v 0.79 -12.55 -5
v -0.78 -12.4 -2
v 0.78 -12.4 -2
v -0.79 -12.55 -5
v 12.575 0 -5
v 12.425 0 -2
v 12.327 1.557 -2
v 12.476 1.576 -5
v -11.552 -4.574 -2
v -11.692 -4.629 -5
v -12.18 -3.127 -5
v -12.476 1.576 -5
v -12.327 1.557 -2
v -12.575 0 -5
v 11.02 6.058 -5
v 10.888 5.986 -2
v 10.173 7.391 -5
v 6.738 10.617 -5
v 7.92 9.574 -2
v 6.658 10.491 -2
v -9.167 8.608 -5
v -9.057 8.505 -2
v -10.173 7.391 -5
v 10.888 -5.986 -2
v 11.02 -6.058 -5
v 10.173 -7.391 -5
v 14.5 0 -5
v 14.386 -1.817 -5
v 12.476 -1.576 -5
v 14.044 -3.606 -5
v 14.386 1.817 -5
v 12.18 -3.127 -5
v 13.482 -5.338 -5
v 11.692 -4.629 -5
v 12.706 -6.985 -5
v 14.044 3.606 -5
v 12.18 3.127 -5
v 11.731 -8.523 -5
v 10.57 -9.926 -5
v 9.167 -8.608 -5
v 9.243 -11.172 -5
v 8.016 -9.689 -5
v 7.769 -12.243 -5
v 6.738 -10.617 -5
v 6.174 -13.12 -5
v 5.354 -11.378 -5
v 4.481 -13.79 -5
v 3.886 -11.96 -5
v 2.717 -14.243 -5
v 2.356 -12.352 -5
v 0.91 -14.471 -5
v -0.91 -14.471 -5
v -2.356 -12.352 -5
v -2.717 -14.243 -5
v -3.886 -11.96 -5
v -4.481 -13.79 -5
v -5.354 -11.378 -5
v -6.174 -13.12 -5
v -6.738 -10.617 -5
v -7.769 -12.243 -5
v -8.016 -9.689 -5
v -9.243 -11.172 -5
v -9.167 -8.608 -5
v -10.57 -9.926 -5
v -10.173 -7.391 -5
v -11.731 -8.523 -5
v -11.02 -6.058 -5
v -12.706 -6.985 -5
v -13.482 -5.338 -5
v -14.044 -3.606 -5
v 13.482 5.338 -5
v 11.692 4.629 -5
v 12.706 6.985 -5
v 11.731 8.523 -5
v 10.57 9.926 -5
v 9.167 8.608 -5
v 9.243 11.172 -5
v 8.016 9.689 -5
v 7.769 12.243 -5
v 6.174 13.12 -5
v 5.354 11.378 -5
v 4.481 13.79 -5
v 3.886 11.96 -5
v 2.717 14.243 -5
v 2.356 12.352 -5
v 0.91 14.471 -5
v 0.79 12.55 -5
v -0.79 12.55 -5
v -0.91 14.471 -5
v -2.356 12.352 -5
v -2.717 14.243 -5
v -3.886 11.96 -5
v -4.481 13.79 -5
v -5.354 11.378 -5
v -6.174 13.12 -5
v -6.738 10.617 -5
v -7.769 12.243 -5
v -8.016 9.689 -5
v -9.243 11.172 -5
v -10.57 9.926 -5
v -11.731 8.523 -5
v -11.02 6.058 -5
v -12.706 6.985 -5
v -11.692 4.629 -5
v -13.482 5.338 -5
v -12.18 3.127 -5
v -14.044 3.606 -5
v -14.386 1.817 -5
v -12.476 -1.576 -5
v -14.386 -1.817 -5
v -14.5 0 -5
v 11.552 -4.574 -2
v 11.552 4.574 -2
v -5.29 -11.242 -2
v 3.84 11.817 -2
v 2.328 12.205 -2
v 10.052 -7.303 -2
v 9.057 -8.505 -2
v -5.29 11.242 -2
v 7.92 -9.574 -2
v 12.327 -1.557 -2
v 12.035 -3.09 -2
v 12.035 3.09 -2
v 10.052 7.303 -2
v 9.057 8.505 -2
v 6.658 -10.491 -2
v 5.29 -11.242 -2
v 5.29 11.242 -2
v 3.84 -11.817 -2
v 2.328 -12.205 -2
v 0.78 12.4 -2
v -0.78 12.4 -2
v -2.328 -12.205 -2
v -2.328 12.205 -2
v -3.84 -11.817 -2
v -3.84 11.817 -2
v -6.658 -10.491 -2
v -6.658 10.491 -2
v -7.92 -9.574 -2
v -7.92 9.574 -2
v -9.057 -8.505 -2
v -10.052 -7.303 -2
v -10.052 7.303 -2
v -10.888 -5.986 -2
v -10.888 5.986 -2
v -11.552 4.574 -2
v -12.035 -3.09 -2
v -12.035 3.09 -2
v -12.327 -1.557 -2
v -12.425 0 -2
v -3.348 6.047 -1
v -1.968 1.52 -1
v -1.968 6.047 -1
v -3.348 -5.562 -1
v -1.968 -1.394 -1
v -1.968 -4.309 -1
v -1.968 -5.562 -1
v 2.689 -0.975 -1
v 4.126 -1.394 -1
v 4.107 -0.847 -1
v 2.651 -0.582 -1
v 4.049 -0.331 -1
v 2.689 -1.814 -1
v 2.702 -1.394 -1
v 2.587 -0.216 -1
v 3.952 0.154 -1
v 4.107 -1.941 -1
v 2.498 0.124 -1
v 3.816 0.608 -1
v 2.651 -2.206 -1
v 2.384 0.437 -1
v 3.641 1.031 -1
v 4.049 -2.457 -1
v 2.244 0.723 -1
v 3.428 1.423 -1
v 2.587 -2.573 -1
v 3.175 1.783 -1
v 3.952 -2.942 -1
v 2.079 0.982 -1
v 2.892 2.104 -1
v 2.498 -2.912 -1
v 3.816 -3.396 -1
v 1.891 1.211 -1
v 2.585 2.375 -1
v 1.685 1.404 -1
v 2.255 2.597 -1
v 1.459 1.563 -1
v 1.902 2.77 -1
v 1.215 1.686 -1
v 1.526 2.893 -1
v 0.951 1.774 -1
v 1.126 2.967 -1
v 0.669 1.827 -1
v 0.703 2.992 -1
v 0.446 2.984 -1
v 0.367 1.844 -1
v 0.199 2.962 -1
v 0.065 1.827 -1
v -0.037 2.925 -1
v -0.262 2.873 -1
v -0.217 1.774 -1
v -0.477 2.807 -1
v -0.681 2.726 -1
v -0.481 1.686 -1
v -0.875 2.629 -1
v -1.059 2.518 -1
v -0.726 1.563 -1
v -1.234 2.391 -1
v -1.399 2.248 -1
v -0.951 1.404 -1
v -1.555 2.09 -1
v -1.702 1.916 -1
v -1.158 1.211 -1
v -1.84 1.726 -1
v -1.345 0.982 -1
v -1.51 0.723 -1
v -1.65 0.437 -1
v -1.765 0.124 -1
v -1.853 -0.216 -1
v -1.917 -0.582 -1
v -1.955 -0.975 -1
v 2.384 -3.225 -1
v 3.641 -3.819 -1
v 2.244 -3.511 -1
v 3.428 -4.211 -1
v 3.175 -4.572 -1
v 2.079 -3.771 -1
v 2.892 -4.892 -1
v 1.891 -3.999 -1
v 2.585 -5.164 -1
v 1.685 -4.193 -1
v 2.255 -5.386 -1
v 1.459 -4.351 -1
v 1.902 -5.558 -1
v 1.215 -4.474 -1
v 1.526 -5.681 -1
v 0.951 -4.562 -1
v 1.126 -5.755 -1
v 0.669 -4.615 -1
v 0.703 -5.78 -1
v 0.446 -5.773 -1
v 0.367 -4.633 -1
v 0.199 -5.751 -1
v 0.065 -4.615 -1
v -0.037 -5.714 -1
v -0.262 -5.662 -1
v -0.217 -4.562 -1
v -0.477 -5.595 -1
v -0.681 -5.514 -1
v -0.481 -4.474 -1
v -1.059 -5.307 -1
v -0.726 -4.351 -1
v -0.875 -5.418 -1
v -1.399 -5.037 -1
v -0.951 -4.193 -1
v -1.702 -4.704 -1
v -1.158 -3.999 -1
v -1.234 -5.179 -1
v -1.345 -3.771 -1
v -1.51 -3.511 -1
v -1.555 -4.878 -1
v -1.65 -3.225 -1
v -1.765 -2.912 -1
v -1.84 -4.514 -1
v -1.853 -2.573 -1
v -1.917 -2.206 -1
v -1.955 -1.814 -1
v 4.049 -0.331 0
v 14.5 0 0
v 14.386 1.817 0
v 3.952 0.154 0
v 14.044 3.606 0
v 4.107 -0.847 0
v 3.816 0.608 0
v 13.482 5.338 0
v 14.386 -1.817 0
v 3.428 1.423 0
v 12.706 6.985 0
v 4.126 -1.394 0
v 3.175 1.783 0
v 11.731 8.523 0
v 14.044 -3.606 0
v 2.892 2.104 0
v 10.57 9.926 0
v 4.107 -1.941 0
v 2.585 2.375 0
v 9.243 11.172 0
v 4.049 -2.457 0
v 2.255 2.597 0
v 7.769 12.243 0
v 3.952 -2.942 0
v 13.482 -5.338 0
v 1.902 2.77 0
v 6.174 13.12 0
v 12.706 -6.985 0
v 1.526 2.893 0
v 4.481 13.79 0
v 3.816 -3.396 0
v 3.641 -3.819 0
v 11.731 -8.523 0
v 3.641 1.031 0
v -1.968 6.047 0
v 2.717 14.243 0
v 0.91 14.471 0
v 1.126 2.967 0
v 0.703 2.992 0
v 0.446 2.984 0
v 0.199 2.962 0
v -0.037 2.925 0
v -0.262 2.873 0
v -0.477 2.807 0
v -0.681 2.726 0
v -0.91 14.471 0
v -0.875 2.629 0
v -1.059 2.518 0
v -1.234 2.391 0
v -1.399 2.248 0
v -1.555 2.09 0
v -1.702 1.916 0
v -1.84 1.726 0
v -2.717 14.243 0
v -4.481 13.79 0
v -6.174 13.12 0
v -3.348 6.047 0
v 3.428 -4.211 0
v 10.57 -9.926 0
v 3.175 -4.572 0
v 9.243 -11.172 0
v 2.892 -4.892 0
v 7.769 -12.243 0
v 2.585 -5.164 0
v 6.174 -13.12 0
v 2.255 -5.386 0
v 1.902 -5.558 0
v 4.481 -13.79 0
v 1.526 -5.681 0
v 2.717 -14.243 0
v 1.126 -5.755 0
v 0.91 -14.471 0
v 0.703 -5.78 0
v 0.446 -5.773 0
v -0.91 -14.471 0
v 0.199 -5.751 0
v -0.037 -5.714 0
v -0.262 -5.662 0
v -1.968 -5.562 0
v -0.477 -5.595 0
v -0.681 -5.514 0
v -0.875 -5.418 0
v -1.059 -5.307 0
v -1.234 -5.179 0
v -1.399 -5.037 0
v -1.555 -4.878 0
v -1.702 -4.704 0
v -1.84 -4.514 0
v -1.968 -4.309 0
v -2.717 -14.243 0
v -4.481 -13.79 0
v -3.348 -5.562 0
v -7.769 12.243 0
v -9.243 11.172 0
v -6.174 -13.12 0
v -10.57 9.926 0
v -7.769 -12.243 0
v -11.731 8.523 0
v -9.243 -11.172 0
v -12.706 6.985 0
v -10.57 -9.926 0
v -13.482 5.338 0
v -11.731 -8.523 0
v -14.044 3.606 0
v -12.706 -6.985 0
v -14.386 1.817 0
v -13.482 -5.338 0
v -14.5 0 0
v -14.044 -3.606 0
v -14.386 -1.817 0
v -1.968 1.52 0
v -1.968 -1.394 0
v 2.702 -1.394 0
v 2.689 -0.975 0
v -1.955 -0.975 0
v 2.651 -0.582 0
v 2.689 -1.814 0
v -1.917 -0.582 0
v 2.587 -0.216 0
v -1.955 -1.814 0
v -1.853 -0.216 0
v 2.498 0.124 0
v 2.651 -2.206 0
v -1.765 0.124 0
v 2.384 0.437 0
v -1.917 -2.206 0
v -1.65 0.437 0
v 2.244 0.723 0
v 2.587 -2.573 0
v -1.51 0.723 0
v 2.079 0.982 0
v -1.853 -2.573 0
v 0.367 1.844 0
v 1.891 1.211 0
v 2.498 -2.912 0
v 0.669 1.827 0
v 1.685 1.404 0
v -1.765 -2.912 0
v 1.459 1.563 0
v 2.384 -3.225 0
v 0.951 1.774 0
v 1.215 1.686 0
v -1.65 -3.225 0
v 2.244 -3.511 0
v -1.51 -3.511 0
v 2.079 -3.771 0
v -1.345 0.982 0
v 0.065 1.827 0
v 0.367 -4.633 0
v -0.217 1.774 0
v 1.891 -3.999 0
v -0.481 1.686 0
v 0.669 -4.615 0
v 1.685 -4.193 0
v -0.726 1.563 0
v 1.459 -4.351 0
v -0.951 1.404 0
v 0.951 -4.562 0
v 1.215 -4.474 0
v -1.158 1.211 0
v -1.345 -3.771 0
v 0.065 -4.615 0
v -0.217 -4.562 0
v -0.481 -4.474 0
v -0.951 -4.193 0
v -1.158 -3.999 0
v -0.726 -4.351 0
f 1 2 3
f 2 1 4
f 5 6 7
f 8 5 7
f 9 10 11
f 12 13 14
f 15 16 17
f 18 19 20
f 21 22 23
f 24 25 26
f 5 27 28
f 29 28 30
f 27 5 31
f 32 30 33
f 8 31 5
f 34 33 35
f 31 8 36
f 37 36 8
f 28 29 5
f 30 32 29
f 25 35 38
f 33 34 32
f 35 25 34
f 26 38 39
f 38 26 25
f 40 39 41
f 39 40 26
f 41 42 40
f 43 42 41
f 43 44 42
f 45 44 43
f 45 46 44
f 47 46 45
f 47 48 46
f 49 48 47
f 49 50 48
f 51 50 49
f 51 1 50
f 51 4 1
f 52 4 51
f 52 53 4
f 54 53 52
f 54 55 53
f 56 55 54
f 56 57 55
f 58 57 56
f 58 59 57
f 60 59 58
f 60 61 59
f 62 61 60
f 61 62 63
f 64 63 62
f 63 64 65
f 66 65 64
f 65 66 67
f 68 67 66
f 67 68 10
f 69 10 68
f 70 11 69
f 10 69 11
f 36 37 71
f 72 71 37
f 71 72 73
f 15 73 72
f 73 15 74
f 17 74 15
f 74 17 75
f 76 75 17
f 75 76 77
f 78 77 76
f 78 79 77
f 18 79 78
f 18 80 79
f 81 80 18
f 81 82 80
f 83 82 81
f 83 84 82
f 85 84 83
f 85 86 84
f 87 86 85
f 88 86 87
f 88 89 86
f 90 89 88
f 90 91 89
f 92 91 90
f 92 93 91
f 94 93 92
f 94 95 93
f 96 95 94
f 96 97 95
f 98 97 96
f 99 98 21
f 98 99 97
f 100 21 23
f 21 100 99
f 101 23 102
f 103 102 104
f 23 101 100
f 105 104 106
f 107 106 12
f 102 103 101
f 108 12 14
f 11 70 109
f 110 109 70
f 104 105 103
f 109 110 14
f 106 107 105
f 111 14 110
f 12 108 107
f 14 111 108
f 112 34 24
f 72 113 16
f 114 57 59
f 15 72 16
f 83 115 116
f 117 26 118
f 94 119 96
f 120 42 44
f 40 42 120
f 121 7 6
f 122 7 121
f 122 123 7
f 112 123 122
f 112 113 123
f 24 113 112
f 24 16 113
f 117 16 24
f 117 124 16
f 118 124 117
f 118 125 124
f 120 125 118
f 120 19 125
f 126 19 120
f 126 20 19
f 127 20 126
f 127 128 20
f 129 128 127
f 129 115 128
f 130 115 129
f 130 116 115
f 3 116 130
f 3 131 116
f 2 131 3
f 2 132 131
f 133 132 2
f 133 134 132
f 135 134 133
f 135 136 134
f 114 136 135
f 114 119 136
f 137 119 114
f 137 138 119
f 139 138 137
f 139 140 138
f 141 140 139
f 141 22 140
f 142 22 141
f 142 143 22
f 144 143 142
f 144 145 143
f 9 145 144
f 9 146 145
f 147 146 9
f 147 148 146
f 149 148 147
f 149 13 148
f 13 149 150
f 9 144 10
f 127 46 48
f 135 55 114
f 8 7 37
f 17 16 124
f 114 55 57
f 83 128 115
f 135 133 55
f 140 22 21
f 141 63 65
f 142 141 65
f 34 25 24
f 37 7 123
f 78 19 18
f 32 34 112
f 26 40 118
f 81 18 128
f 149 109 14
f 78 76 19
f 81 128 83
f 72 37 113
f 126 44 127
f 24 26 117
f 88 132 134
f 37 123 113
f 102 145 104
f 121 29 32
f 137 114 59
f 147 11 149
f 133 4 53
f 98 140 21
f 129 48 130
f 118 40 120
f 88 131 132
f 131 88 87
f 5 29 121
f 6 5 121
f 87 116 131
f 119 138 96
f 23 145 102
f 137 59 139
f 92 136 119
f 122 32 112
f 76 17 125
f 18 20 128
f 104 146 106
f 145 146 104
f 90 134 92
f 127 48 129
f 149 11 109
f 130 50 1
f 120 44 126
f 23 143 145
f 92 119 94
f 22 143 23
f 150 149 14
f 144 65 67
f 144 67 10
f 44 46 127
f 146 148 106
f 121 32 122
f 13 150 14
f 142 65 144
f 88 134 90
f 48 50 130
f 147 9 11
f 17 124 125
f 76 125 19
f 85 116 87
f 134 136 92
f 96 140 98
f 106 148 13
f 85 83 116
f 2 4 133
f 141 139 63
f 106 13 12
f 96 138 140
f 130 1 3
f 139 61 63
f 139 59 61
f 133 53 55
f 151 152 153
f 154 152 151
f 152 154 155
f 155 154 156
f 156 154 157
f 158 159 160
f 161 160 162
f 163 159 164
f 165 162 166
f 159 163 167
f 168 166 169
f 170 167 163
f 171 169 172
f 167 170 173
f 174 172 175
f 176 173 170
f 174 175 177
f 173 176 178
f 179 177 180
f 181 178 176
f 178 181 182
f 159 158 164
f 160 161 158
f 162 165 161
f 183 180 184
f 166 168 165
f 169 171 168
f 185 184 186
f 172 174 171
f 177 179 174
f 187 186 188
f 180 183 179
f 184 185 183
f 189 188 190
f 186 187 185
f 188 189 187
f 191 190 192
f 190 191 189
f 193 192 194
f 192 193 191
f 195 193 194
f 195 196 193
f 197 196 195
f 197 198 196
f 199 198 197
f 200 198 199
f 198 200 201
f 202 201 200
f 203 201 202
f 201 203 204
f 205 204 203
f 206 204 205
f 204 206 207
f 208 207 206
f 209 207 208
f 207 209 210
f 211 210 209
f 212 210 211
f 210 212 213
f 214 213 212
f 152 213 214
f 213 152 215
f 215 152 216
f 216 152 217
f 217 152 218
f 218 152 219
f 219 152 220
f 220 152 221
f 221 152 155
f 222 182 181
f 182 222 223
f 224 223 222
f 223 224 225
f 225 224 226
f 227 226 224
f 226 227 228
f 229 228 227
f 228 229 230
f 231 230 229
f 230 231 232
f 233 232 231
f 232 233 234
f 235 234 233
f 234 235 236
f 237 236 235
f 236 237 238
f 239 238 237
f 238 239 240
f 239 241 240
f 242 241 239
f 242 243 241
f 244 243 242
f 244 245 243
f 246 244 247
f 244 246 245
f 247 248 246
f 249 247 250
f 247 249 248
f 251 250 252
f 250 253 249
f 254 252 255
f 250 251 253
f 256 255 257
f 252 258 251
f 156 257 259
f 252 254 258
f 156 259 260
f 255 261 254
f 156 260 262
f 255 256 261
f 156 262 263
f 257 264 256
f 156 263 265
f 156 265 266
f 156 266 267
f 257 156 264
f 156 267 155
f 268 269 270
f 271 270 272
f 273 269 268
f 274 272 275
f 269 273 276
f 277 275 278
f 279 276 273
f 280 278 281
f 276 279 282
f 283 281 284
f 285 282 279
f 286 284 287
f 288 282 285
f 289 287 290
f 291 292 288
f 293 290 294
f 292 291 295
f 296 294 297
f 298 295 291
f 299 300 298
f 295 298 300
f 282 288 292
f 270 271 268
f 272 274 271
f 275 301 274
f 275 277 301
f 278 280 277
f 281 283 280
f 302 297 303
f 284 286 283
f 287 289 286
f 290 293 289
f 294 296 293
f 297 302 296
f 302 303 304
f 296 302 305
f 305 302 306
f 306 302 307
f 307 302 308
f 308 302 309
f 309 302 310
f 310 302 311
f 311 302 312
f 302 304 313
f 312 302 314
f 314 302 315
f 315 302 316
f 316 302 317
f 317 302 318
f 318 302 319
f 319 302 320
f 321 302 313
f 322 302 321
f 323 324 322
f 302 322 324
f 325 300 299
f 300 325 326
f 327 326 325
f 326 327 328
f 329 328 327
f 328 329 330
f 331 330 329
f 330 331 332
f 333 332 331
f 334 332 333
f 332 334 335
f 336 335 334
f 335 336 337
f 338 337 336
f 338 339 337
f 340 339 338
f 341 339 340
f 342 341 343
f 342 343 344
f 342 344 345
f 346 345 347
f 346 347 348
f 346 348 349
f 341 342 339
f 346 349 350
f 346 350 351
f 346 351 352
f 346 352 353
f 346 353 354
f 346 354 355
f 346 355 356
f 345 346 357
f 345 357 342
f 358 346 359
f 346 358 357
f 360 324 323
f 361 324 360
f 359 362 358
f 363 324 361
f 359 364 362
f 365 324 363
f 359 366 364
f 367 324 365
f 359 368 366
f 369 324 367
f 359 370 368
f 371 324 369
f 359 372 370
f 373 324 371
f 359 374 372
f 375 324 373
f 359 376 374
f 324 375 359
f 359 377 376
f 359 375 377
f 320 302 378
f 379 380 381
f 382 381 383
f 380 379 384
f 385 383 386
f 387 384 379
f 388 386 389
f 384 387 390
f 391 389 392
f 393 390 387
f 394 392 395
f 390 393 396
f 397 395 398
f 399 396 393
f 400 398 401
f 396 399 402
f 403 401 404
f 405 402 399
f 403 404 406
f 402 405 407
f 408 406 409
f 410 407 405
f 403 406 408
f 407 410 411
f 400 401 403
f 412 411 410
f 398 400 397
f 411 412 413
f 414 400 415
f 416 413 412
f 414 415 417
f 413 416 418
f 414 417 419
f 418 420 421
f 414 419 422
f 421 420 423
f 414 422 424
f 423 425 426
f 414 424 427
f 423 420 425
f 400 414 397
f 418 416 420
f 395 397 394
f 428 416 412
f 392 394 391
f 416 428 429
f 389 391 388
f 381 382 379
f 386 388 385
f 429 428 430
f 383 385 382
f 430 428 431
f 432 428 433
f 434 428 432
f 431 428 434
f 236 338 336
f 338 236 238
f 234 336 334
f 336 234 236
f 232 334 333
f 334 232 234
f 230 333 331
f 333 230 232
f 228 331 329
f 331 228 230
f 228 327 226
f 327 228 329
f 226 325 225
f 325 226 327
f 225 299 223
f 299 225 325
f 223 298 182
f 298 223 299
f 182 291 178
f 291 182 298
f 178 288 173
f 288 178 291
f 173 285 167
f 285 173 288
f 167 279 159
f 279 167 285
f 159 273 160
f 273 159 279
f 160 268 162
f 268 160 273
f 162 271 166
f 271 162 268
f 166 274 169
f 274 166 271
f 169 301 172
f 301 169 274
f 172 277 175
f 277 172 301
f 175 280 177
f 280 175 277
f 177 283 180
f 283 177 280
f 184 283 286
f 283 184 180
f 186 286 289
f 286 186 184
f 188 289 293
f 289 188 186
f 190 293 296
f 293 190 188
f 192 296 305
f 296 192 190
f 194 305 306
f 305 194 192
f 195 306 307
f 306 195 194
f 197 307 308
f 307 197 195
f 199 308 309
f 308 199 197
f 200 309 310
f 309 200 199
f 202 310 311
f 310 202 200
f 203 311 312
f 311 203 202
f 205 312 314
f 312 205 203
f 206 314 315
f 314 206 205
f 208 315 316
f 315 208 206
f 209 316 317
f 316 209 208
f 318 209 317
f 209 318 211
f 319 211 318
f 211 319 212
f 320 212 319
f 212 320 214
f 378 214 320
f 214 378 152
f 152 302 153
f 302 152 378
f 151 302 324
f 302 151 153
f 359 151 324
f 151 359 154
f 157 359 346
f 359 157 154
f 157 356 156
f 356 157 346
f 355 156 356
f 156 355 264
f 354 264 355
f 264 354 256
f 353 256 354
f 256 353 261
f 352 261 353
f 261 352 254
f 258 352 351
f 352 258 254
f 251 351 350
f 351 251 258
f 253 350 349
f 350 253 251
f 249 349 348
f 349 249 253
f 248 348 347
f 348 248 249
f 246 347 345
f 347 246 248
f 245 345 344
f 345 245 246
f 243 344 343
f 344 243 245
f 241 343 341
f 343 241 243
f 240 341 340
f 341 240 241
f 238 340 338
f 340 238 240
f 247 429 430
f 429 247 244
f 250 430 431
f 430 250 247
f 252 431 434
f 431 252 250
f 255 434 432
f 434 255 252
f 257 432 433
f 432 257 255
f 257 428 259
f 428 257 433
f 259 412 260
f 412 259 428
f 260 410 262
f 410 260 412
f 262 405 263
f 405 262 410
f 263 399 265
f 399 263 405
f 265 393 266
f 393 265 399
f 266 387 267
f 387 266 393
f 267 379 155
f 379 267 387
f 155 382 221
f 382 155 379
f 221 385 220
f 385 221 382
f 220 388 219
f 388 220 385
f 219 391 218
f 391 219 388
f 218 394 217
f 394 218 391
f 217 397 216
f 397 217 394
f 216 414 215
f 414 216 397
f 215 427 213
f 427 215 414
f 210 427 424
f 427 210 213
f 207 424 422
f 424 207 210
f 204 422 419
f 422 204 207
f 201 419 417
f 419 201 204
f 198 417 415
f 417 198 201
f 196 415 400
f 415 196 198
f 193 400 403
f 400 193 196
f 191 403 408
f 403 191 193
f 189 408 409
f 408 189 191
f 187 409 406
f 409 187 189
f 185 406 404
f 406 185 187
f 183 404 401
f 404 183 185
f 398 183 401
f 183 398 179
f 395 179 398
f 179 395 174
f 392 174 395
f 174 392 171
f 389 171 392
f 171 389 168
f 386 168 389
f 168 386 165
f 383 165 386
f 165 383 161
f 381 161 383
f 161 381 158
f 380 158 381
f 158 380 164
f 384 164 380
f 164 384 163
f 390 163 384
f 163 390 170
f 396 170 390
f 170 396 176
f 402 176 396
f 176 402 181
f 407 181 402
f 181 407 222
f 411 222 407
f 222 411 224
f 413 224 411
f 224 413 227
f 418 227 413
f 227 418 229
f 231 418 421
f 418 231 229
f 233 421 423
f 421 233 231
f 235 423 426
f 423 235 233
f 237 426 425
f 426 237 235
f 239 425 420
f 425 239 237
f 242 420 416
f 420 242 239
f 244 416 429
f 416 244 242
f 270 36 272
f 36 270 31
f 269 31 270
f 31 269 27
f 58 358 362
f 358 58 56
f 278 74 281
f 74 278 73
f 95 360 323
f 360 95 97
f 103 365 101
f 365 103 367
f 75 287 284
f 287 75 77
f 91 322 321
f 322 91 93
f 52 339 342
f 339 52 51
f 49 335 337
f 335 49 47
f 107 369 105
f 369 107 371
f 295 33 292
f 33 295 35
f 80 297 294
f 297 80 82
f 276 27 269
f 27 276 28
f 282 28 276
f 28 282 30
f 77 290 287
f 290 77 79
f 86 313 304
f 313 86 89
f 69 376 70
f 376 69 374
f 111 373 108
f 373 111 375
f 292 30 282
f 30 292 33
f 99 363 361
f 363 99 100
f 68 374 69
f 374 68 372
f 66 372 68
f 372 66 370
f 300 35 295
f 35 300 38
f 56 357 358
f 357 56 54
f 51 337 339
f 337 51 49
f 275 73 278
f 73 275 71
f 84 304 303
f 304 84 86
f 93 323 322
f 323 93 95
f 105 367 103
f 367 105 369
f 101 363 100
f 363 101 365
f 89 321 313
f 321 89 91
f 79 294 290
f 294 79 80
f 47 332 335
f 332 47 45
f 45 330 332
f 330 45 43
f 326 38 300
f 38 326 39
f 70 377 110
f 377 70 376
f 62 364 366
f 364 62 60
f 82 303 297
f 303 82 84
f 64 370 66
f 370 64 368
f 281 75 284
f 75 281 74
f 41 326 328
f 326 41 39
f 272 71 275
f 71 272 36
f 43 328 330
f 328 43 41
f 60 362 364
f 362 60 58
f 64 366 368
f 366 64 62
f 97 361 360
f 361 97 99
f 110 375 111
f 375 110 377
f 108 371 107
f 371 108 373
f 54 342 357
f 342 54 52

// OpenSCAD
$fn = 50;

difference() {
	union() {
		translate(v = [0, 0, -5.0]) {
			cylinder(h = 5, r = 14.5);
		}
	}
	union() {
		#translate(v = [0, 0, -5.0]) {
			cylinder(h = 3, r1 = 12.575, r2 = 12.425);
		}
		translate(v = [0, 0, -1]) {
			linear_extrude(height = 1) {
				text(font = "Webdings", halign = "center", size = 11, text = "b", valign = "center");
			}
		}
	}
}
